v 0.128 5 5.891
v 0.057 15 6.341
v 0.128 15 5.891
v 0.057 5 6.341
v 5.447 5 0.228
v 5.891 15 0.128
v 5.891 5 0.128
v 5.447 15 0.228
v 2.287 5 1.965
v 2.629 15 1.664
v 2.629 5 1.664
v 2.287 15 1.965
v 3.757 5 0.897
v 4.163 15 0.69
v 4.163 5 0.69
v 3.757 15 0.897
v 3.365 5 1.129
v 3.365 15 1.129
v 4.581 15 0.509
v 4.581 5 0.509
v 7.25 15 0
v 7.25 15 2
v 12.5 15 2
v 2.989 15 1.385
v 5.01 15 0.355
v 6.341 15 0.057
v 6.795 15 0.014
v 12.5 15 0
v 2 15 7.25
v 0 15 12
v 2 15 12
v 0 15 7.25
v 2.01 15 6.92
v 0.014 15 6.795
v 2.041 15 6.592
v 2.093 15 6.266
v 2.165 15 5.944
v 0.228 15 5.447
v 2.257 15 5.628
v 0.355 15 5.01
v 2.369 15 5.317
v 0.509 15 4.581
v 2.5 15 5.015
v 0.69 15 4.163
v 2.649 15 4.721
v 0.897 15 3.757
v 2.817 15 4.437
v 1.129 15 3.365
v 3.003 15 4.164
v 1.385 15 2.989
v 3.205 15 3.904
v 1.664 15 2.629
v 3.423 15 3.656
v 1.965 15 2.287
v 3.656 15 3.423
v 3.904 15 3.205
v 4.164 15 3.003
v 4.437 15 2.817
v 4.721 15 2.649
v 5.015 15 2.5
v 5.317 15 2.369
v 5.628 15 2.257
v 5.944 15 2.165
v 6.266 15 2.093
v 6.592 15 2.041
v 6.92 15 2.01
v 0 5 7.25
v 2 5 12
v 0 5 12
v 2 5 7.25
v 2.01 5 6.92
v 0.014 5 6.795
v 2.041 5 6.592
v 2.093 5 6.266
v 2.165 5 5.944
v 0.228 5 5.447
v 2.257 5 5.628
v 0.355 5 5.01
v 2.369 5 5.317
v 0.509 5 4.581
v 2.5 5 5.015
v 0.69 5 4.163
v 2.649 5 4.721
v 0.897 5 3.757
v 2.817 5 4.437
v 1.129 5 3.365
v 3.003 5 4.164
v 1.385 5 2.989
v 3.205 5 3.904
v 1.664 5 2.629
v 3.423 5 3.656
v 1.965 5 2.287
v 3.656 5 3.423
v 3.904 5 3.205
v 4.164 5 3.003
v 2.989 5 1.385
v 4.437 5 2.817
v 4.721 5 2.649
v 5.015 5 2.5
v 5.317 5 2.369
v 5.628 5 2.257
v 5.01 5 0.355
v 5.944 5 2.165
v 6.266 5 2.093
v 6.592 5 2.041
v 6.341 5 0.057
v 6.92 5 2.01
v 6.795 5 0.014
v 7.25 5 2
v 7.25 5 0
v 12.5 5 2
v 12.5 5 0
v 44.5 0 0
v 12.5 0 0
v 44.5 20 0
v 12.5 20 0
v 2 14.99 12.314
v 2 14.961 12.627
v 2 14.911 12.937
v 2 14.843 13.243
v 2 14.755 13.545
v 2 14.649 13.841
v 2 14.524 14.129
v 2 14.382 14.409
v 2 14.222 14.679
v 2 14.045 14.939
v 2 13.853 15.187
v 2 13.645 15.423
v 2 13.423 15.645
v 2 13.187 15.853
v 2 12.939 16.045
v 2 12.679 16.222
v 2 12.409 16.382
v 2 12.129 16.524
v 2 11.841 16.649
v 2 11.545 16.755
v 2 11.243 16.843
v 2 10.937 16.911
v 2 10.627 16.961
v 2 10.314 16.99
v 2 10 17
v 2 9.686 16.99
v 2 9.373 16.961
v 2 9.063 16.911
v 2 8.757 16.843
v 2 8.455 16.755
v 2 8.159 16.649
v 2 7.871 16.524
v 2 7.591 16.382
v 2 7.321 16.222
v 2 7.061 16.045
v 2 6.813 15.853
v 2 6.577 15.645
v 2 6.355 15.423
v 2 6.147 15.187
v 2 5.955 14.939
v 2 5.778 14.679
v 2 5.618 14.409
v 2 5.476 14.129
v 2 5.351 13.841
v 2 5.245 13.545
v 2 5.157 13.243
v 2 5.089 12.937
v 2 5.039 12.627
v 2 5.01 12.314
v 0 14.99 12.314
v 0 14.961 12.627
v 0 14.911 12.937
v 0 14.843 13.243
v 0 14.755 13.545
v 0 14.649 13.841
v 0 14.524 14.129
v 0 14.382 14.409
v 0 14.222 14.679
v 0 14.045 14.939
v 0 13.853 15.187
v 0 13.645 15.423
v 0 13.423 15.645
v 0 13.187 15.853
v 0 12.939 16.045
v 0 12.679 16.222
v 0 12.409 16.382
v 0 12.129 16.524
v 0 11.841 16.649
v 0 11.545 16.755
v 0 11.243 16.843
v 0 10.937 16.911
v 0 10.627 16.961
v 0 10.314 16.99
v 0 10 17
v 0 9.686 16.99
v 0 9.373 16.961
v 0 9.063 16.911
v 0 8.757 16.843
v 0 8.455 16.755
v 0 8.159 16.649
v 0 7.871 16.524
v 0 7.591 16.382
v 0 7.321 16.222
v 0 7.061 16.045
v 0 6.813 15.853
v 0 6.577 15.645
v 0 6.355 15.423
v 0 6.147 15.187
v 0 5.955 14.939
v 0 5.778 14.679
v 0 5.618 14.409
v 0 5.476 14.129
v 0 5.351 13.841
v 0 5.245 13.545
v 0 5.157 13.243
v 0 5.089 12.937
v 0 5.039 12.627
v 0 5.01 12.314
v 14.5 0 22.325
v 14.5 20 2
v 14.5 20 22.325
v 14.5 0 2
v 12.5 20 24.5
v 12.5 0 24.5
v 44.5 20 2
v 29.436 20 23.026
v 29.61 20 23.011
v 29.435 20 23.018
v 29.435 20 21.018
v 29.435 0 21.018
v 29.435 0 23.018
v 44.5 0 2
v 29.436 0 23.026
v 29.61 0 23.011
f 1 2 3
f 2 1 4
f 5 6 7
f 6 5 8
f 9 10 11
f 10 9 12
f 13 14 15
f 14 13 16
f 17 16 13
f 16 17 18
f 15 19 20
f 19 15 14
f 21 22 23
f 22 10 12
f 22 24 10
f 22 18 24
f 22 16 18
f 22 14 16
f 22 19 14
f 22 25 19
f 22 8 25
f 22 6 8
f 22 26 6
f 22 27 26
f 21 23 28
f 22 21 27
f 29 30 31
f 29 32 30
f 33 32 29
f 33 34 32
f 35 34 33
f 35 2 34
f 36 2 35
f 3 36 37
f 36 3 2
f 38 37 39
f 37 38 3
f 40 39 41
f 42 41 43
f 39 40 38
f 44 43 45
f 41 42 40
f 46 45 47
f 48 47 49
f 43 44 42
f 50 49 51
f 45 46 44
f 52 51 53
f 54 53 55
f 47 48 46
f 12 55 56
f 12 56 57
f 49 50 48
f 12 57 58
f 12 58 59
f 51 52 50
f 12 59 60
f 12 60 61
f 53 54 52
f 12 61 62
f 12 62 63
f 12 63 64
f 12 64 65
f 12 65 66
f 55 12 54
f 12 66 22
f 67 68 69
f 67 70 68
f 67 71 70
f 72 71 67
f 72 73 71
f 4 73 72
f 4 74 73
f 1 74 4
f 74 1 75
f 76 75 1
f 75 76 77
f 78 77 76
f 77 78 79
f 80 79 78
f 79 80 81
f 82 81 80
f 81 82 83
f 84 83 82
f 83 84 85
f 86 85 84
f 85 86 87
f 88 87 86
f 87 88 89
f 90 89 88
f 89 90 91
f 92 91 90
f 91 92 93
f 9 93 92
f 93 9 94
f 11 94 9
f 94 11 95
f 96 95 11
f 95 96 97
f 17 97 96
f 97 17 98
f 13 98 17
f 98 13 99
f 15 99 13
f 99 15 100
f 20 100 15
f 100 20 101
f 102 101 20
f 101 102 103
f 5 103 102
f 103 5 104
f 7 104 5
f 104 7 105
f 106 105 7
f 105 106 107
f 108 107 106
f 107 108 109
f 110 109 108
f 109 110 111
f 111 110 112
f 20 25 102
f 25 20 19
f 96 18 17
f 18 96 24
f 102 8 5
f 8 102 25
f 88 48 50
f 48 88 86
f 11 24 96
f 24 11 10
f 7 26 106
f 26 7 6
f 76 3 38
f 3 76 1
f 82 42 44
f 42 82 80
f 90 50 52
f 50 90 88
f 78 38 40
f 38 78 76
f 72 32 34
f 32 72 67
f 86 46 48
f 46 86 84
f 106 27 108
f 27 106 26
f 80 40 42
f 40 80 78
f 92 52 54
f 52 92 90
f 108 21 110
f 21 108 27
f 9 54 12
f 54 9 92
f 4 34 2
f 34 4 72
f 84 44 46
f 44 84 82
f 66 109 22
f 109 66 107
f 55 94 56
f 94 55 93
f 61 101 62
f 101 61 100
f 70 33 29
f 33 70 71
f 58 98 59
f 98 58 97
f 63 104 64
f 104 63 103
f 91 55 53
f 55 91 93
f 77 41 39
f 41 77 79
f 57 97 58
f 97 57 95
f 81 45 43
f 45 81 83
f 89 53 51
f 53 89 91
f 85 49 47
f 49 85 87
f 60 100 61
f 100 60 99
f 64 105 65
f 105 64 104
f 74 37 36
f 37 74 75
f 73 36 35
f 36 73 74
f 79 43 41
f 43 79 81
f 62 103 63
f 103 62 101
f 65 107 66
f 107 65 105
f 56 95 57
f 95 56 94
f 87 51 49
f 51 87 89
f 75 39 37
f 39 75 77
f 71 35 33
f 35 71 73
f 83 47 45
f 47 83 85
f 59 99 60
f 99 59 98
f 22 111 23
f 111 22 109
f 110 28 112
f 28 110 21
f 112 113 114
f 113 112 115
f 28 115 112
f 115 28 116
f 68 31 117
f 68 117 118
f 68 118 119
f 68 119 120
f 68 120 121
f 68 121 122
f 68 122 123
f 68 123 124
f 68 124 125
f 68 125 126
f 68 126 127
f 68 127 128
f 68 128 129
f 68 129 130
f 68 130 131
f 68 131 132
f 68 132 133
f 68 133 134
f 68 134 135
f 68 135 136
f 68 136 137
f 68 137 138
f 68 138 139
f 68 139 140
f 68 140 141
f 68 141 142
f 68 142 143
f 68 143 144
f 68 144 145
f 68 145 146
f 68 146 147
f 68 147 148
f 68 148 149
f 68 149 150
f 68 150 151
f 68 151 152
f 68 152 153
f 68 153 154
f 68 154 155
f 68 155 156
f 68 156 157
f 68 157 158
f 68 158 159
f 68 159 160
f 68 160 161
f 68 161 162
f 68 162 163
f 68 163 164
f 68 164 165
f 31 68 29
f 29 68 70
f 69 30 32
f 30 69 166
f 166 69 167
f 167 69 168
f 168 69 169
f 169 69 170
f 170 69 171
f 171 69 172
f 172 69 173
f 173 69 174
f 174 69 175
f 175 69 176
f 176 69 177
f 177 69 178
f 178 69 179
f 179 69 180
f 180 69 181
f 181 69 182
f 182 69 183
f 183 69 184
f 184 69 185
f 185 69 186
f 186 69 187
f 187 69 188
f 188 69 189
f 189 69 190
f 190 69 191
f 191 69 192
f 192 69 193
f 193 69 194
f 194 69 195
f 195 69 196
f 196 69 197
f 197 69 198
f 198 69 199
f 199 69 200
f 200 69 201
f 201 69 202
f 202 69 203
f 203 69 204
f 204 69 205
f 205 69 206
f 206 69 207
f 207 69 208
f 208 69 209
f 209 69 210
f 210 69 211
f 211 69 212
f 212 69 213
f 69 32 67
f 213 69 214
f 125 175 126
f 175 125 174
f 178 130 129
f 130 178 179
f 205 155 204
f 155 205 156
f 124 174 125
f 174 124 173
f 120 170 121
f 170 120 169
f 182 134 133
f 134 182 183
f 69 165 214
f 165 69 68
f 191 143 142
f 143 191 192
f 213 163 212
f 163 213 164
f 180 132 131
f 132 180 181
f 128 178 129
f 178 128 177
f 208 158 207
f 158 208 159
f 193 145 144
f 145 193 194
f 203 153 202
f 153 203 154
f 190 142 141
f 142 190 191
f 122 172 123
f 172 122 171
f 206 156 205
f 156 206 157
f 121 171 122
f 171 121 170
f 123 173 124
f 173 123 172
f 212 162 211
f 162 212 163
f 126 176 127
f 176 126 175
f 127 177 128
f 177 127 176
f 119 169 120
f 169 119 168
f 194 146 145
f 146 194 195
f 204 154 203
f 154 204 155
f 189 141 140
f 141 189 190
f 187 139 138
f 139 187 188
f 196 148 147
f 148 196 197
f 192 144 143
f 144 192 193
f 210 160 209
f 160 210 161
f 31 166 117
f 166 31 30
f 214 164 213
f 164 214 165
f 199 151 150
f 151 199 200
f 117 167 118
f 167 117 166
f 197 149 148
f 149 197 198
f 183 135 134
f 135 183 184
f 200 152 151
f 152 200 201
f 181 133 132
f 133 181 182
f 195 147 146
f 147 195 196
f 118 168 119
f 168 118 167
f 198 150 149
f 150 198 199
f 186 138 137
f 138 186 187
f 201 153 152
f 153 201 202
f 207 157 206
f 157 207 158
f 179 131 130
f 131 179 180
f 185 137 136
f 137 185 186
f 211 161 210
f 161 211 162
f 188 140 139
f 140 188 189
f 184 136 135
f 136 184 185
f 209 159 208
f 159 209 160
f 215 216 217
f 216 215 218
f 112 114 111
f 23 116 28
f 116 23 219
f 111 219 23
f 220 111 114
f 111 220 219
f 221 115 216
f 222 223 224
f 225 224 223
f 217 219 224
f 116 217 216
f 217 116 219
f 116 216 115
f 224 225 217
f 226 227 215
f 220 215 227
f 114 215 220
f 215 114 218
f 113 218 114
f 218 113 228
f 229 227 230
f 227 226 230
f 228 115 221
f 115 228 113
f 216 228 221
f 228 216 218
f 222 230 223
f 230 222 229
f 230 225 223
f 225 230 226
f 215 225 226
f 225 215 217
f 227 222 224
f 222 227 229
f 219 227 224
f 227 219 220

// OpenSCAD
//!OpenSCAD
// title      : Customizable  Table Hook
// version    : v1.0.1
// author     : Pau Drudis
// license    : MIT License
// description: A tiny customizable table hook
// file       : customizable-table-hook.scad

/******************
 *** Properties ***
 ******************/
 /*[ global properties ]*/

// Resolution of the piece
Resolution = 100;

// Thickness of hook
Thickness = 2;

/*[ properties of Pin ]*/
// Width of the pin
Pin_Width = 20;

// Height of the table skirt
Table_Height = 20.5;

// Length of the pin's top arm
Length_Top_Arm = 15;

// Length of the pin's bottom arm
Length_Bottom_Arm = 30;

// Angle of the pin's top arm
Pin_Angle = 5; // [0:0.1:10]

/*[ properties of Hook ]*/
// Width of the hook
Hook_Width = 10;

// Length of the hook
Hook_Length = 12.5;

// Height of the hook
Hook_Height = 15;

// Curvature of the hook's base
Hook_Curvature = 0.5; //[0:0.1:1]

// How curved is the hook's tongue
Tongue = 1; //[0:0.1:1]

/******************
 ***  Instance  ***
 ******************/
tableHook(thickness=Thickness, pinWidth=Pin_Width, tableHeight=Table_Height, lengthTop=Length_Top_Arm, lengthBottom=Length_Bottom_Arm, pinAngle=Pin_Angle, hookWidth=Hook_Width, hookLength=Hook_Length, hookHeight=Hook_Height, hookCurvature=Hook_Curvature, tongue=Tongue, $fn=Resolution);

/******************
 ***    Code    ***
 ******************/
module pin(width = 20, height = 21, lengthBottom = 34, lengthTop = 20, angle=0, thickness = 2) {
    difference() {
        union() {
            cube([thickness, width, height+(2*thickness)]);
            cube([thickness+lengthBottom, width, thickness]);
            translate([0, 0, height+thickness])
                rotate([0, angle, 0])
                    cube([thickness+lengthTop, width, thickness]);
        }
        translate([0, 0, height+(2*thickness)])
            rotate([0, angle, 0])
                cube([thickness+lengthTop, width, thickness]);
    }
}

module tube(height=1, diameterOut=2, diameterIn=1, center=false) {
    difference() {
        cylinder(h=height, d=diameterOut, center=center);
        translate([0, 0, -0.1])
            cylinder(h=height + 0.2, d=diameterIn, center=center);
    }
}

module tongueMold(width=20, eccentricity=0) {
    translate([0, 0, width*(1-eccentricity)/2])
        difference() {
            translate([-0.1,-0.1,0])
                cube([width+0.2, width+0.2, (width/2)+0.1]);
            rotate([0, 90, 0])
                translate([0, width/2, 0])
                    scale([1,1/eccentricity,1])
                        cylinder(h=width, d=width*eccentricity);
        }
}

module baseHook(width=20, length=20, height=15, curvature=0, thickness=2) {
    if (curvature <= 0) union() {
        cube([length+thickness, width, thickness]);
        cube([thickness, width, height+thickness]);
    }
    else {
        pipe = (min(length, height)+thickness)*2*min(1, curvature);
        union() {
            translate([pipe/2, 0, pipe/2])
                intersection() {
                    rotate([-90, 0, 0])
                        tube(height=width, diameterOut=pipe, diameterIn=pipe-(2*thickness));
                    translate([-pipe/2, 0, -pipe/2])
                        cube([pipe/2, width, pipe/2]);
                }
            translate([pipe/2, 0, 0])
                cube([length+thickness-(pipe/2), width, thickness]);
            translate([0, 0, pipe/2])
                cube([thickness, width, height+thickness-(pipe/2)]);
        }
    }
}

module hook(width=18, length=12.5, height=15, curvature=0.3, thickness=2, tongue=1) {
    difference() {
        baseHook(width=width, length=length, height=height, curvature=curvature, thickness=thickness);
        translate([-width/2, 0, height+thickness+(-width/2)])
            tongueMold(width=width, eccentricity=tongue);
    }
}

module tableHook(thickness=2, pinWidth=20, tableHeight=21, lengthTop=20, lengthBottom=34, pinAngle=0, hookWidth=18, hookLength=12.5, hookHeight=15, hookCurvature=0.3, tongue=1) {
    
    translate([0, (pinWidth-hookWidth)/2, 0])
        hook(width=hookWidth, length=hookLength, height=hookHeight, curvature=hookCurvature, thickness=thickness, tongue=tongue);
    translate([hookLength, 0, 0])
        pin(width=pinWidth, height=tableHeight, lengthBottom=lengthBottom, lengthTop=lengthTop, angle=pinAngle, thickness=thickness);
}
